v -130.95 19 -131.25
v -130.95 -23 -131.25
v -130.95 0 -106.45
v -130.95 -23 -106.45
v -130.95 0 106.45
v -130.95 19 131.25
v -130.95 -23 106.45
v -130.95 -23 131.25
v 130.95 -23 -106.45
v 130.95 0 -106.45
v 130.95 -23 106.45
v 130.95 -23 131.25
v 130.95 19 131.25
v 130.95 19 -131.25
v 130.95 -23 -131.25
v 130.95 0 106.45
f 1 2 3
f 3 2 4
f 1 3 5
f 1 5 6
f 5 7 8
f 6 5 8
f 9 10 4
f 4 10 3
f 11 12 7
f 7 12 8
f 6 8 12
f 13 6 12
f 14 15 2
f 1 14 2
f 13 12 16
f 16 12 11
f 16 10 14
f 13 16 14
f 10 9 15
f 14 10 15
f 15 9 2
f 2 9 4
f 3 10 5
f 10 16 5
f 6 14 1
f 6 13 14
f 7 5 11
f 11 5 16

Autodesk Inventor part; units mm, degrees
ref_plane "YZ Plane" through (0, 0, 0) normal (1, 0, 0) x (0, 1, 0)
ref_plane "XZ Plane" through (0, 0, 0) normal (0, 1, 0) x (-1, 0, 0)
ref_plane "XY Plane" through (0, 0, 0) normal (0, 0, 1) x (1, 0, 0)
sketch "Esboço1" plane through (0, 0, 0) normal (0, 1, 0) x (-1, 0, 0)
  line L0 (130.95, 131.25) -> (-130.95, 131.25)
  line L1 (-130.95, 131.25) -> (-130.95, -131.25)
  line L2 (-130.95, -131.25) -> (130.95, -131.25)
  line L3 (130.95, -131.25) -> (130.95, 131.25)
  line L4 (130.95, 131.25) -> (-130.95, -131.25) construction
  line L5 (-130.95, 131.25) -> (130.95, -131.25) construction
  line L6 (130.95, 106.45) -> (-130.95, 106.45)
  line L7 (-130.95, -106.45) -> (130.95, -106.45)
  point P0 (0, 0)
  dimension "d0" = 261.9
  dimension "d1" = 262.5
  dimension "d2" = 24.8
  dimension "d3" = 24.8
extrude "Extrusão1" add sketch "Esboço1" along normal blind 19
extrude "Extrusão2" add sketch "Esboço1" against normal blind 23 contours L3 L6 L1 L0 | L3 L2 L1 L7
properties part number "Tampa"
